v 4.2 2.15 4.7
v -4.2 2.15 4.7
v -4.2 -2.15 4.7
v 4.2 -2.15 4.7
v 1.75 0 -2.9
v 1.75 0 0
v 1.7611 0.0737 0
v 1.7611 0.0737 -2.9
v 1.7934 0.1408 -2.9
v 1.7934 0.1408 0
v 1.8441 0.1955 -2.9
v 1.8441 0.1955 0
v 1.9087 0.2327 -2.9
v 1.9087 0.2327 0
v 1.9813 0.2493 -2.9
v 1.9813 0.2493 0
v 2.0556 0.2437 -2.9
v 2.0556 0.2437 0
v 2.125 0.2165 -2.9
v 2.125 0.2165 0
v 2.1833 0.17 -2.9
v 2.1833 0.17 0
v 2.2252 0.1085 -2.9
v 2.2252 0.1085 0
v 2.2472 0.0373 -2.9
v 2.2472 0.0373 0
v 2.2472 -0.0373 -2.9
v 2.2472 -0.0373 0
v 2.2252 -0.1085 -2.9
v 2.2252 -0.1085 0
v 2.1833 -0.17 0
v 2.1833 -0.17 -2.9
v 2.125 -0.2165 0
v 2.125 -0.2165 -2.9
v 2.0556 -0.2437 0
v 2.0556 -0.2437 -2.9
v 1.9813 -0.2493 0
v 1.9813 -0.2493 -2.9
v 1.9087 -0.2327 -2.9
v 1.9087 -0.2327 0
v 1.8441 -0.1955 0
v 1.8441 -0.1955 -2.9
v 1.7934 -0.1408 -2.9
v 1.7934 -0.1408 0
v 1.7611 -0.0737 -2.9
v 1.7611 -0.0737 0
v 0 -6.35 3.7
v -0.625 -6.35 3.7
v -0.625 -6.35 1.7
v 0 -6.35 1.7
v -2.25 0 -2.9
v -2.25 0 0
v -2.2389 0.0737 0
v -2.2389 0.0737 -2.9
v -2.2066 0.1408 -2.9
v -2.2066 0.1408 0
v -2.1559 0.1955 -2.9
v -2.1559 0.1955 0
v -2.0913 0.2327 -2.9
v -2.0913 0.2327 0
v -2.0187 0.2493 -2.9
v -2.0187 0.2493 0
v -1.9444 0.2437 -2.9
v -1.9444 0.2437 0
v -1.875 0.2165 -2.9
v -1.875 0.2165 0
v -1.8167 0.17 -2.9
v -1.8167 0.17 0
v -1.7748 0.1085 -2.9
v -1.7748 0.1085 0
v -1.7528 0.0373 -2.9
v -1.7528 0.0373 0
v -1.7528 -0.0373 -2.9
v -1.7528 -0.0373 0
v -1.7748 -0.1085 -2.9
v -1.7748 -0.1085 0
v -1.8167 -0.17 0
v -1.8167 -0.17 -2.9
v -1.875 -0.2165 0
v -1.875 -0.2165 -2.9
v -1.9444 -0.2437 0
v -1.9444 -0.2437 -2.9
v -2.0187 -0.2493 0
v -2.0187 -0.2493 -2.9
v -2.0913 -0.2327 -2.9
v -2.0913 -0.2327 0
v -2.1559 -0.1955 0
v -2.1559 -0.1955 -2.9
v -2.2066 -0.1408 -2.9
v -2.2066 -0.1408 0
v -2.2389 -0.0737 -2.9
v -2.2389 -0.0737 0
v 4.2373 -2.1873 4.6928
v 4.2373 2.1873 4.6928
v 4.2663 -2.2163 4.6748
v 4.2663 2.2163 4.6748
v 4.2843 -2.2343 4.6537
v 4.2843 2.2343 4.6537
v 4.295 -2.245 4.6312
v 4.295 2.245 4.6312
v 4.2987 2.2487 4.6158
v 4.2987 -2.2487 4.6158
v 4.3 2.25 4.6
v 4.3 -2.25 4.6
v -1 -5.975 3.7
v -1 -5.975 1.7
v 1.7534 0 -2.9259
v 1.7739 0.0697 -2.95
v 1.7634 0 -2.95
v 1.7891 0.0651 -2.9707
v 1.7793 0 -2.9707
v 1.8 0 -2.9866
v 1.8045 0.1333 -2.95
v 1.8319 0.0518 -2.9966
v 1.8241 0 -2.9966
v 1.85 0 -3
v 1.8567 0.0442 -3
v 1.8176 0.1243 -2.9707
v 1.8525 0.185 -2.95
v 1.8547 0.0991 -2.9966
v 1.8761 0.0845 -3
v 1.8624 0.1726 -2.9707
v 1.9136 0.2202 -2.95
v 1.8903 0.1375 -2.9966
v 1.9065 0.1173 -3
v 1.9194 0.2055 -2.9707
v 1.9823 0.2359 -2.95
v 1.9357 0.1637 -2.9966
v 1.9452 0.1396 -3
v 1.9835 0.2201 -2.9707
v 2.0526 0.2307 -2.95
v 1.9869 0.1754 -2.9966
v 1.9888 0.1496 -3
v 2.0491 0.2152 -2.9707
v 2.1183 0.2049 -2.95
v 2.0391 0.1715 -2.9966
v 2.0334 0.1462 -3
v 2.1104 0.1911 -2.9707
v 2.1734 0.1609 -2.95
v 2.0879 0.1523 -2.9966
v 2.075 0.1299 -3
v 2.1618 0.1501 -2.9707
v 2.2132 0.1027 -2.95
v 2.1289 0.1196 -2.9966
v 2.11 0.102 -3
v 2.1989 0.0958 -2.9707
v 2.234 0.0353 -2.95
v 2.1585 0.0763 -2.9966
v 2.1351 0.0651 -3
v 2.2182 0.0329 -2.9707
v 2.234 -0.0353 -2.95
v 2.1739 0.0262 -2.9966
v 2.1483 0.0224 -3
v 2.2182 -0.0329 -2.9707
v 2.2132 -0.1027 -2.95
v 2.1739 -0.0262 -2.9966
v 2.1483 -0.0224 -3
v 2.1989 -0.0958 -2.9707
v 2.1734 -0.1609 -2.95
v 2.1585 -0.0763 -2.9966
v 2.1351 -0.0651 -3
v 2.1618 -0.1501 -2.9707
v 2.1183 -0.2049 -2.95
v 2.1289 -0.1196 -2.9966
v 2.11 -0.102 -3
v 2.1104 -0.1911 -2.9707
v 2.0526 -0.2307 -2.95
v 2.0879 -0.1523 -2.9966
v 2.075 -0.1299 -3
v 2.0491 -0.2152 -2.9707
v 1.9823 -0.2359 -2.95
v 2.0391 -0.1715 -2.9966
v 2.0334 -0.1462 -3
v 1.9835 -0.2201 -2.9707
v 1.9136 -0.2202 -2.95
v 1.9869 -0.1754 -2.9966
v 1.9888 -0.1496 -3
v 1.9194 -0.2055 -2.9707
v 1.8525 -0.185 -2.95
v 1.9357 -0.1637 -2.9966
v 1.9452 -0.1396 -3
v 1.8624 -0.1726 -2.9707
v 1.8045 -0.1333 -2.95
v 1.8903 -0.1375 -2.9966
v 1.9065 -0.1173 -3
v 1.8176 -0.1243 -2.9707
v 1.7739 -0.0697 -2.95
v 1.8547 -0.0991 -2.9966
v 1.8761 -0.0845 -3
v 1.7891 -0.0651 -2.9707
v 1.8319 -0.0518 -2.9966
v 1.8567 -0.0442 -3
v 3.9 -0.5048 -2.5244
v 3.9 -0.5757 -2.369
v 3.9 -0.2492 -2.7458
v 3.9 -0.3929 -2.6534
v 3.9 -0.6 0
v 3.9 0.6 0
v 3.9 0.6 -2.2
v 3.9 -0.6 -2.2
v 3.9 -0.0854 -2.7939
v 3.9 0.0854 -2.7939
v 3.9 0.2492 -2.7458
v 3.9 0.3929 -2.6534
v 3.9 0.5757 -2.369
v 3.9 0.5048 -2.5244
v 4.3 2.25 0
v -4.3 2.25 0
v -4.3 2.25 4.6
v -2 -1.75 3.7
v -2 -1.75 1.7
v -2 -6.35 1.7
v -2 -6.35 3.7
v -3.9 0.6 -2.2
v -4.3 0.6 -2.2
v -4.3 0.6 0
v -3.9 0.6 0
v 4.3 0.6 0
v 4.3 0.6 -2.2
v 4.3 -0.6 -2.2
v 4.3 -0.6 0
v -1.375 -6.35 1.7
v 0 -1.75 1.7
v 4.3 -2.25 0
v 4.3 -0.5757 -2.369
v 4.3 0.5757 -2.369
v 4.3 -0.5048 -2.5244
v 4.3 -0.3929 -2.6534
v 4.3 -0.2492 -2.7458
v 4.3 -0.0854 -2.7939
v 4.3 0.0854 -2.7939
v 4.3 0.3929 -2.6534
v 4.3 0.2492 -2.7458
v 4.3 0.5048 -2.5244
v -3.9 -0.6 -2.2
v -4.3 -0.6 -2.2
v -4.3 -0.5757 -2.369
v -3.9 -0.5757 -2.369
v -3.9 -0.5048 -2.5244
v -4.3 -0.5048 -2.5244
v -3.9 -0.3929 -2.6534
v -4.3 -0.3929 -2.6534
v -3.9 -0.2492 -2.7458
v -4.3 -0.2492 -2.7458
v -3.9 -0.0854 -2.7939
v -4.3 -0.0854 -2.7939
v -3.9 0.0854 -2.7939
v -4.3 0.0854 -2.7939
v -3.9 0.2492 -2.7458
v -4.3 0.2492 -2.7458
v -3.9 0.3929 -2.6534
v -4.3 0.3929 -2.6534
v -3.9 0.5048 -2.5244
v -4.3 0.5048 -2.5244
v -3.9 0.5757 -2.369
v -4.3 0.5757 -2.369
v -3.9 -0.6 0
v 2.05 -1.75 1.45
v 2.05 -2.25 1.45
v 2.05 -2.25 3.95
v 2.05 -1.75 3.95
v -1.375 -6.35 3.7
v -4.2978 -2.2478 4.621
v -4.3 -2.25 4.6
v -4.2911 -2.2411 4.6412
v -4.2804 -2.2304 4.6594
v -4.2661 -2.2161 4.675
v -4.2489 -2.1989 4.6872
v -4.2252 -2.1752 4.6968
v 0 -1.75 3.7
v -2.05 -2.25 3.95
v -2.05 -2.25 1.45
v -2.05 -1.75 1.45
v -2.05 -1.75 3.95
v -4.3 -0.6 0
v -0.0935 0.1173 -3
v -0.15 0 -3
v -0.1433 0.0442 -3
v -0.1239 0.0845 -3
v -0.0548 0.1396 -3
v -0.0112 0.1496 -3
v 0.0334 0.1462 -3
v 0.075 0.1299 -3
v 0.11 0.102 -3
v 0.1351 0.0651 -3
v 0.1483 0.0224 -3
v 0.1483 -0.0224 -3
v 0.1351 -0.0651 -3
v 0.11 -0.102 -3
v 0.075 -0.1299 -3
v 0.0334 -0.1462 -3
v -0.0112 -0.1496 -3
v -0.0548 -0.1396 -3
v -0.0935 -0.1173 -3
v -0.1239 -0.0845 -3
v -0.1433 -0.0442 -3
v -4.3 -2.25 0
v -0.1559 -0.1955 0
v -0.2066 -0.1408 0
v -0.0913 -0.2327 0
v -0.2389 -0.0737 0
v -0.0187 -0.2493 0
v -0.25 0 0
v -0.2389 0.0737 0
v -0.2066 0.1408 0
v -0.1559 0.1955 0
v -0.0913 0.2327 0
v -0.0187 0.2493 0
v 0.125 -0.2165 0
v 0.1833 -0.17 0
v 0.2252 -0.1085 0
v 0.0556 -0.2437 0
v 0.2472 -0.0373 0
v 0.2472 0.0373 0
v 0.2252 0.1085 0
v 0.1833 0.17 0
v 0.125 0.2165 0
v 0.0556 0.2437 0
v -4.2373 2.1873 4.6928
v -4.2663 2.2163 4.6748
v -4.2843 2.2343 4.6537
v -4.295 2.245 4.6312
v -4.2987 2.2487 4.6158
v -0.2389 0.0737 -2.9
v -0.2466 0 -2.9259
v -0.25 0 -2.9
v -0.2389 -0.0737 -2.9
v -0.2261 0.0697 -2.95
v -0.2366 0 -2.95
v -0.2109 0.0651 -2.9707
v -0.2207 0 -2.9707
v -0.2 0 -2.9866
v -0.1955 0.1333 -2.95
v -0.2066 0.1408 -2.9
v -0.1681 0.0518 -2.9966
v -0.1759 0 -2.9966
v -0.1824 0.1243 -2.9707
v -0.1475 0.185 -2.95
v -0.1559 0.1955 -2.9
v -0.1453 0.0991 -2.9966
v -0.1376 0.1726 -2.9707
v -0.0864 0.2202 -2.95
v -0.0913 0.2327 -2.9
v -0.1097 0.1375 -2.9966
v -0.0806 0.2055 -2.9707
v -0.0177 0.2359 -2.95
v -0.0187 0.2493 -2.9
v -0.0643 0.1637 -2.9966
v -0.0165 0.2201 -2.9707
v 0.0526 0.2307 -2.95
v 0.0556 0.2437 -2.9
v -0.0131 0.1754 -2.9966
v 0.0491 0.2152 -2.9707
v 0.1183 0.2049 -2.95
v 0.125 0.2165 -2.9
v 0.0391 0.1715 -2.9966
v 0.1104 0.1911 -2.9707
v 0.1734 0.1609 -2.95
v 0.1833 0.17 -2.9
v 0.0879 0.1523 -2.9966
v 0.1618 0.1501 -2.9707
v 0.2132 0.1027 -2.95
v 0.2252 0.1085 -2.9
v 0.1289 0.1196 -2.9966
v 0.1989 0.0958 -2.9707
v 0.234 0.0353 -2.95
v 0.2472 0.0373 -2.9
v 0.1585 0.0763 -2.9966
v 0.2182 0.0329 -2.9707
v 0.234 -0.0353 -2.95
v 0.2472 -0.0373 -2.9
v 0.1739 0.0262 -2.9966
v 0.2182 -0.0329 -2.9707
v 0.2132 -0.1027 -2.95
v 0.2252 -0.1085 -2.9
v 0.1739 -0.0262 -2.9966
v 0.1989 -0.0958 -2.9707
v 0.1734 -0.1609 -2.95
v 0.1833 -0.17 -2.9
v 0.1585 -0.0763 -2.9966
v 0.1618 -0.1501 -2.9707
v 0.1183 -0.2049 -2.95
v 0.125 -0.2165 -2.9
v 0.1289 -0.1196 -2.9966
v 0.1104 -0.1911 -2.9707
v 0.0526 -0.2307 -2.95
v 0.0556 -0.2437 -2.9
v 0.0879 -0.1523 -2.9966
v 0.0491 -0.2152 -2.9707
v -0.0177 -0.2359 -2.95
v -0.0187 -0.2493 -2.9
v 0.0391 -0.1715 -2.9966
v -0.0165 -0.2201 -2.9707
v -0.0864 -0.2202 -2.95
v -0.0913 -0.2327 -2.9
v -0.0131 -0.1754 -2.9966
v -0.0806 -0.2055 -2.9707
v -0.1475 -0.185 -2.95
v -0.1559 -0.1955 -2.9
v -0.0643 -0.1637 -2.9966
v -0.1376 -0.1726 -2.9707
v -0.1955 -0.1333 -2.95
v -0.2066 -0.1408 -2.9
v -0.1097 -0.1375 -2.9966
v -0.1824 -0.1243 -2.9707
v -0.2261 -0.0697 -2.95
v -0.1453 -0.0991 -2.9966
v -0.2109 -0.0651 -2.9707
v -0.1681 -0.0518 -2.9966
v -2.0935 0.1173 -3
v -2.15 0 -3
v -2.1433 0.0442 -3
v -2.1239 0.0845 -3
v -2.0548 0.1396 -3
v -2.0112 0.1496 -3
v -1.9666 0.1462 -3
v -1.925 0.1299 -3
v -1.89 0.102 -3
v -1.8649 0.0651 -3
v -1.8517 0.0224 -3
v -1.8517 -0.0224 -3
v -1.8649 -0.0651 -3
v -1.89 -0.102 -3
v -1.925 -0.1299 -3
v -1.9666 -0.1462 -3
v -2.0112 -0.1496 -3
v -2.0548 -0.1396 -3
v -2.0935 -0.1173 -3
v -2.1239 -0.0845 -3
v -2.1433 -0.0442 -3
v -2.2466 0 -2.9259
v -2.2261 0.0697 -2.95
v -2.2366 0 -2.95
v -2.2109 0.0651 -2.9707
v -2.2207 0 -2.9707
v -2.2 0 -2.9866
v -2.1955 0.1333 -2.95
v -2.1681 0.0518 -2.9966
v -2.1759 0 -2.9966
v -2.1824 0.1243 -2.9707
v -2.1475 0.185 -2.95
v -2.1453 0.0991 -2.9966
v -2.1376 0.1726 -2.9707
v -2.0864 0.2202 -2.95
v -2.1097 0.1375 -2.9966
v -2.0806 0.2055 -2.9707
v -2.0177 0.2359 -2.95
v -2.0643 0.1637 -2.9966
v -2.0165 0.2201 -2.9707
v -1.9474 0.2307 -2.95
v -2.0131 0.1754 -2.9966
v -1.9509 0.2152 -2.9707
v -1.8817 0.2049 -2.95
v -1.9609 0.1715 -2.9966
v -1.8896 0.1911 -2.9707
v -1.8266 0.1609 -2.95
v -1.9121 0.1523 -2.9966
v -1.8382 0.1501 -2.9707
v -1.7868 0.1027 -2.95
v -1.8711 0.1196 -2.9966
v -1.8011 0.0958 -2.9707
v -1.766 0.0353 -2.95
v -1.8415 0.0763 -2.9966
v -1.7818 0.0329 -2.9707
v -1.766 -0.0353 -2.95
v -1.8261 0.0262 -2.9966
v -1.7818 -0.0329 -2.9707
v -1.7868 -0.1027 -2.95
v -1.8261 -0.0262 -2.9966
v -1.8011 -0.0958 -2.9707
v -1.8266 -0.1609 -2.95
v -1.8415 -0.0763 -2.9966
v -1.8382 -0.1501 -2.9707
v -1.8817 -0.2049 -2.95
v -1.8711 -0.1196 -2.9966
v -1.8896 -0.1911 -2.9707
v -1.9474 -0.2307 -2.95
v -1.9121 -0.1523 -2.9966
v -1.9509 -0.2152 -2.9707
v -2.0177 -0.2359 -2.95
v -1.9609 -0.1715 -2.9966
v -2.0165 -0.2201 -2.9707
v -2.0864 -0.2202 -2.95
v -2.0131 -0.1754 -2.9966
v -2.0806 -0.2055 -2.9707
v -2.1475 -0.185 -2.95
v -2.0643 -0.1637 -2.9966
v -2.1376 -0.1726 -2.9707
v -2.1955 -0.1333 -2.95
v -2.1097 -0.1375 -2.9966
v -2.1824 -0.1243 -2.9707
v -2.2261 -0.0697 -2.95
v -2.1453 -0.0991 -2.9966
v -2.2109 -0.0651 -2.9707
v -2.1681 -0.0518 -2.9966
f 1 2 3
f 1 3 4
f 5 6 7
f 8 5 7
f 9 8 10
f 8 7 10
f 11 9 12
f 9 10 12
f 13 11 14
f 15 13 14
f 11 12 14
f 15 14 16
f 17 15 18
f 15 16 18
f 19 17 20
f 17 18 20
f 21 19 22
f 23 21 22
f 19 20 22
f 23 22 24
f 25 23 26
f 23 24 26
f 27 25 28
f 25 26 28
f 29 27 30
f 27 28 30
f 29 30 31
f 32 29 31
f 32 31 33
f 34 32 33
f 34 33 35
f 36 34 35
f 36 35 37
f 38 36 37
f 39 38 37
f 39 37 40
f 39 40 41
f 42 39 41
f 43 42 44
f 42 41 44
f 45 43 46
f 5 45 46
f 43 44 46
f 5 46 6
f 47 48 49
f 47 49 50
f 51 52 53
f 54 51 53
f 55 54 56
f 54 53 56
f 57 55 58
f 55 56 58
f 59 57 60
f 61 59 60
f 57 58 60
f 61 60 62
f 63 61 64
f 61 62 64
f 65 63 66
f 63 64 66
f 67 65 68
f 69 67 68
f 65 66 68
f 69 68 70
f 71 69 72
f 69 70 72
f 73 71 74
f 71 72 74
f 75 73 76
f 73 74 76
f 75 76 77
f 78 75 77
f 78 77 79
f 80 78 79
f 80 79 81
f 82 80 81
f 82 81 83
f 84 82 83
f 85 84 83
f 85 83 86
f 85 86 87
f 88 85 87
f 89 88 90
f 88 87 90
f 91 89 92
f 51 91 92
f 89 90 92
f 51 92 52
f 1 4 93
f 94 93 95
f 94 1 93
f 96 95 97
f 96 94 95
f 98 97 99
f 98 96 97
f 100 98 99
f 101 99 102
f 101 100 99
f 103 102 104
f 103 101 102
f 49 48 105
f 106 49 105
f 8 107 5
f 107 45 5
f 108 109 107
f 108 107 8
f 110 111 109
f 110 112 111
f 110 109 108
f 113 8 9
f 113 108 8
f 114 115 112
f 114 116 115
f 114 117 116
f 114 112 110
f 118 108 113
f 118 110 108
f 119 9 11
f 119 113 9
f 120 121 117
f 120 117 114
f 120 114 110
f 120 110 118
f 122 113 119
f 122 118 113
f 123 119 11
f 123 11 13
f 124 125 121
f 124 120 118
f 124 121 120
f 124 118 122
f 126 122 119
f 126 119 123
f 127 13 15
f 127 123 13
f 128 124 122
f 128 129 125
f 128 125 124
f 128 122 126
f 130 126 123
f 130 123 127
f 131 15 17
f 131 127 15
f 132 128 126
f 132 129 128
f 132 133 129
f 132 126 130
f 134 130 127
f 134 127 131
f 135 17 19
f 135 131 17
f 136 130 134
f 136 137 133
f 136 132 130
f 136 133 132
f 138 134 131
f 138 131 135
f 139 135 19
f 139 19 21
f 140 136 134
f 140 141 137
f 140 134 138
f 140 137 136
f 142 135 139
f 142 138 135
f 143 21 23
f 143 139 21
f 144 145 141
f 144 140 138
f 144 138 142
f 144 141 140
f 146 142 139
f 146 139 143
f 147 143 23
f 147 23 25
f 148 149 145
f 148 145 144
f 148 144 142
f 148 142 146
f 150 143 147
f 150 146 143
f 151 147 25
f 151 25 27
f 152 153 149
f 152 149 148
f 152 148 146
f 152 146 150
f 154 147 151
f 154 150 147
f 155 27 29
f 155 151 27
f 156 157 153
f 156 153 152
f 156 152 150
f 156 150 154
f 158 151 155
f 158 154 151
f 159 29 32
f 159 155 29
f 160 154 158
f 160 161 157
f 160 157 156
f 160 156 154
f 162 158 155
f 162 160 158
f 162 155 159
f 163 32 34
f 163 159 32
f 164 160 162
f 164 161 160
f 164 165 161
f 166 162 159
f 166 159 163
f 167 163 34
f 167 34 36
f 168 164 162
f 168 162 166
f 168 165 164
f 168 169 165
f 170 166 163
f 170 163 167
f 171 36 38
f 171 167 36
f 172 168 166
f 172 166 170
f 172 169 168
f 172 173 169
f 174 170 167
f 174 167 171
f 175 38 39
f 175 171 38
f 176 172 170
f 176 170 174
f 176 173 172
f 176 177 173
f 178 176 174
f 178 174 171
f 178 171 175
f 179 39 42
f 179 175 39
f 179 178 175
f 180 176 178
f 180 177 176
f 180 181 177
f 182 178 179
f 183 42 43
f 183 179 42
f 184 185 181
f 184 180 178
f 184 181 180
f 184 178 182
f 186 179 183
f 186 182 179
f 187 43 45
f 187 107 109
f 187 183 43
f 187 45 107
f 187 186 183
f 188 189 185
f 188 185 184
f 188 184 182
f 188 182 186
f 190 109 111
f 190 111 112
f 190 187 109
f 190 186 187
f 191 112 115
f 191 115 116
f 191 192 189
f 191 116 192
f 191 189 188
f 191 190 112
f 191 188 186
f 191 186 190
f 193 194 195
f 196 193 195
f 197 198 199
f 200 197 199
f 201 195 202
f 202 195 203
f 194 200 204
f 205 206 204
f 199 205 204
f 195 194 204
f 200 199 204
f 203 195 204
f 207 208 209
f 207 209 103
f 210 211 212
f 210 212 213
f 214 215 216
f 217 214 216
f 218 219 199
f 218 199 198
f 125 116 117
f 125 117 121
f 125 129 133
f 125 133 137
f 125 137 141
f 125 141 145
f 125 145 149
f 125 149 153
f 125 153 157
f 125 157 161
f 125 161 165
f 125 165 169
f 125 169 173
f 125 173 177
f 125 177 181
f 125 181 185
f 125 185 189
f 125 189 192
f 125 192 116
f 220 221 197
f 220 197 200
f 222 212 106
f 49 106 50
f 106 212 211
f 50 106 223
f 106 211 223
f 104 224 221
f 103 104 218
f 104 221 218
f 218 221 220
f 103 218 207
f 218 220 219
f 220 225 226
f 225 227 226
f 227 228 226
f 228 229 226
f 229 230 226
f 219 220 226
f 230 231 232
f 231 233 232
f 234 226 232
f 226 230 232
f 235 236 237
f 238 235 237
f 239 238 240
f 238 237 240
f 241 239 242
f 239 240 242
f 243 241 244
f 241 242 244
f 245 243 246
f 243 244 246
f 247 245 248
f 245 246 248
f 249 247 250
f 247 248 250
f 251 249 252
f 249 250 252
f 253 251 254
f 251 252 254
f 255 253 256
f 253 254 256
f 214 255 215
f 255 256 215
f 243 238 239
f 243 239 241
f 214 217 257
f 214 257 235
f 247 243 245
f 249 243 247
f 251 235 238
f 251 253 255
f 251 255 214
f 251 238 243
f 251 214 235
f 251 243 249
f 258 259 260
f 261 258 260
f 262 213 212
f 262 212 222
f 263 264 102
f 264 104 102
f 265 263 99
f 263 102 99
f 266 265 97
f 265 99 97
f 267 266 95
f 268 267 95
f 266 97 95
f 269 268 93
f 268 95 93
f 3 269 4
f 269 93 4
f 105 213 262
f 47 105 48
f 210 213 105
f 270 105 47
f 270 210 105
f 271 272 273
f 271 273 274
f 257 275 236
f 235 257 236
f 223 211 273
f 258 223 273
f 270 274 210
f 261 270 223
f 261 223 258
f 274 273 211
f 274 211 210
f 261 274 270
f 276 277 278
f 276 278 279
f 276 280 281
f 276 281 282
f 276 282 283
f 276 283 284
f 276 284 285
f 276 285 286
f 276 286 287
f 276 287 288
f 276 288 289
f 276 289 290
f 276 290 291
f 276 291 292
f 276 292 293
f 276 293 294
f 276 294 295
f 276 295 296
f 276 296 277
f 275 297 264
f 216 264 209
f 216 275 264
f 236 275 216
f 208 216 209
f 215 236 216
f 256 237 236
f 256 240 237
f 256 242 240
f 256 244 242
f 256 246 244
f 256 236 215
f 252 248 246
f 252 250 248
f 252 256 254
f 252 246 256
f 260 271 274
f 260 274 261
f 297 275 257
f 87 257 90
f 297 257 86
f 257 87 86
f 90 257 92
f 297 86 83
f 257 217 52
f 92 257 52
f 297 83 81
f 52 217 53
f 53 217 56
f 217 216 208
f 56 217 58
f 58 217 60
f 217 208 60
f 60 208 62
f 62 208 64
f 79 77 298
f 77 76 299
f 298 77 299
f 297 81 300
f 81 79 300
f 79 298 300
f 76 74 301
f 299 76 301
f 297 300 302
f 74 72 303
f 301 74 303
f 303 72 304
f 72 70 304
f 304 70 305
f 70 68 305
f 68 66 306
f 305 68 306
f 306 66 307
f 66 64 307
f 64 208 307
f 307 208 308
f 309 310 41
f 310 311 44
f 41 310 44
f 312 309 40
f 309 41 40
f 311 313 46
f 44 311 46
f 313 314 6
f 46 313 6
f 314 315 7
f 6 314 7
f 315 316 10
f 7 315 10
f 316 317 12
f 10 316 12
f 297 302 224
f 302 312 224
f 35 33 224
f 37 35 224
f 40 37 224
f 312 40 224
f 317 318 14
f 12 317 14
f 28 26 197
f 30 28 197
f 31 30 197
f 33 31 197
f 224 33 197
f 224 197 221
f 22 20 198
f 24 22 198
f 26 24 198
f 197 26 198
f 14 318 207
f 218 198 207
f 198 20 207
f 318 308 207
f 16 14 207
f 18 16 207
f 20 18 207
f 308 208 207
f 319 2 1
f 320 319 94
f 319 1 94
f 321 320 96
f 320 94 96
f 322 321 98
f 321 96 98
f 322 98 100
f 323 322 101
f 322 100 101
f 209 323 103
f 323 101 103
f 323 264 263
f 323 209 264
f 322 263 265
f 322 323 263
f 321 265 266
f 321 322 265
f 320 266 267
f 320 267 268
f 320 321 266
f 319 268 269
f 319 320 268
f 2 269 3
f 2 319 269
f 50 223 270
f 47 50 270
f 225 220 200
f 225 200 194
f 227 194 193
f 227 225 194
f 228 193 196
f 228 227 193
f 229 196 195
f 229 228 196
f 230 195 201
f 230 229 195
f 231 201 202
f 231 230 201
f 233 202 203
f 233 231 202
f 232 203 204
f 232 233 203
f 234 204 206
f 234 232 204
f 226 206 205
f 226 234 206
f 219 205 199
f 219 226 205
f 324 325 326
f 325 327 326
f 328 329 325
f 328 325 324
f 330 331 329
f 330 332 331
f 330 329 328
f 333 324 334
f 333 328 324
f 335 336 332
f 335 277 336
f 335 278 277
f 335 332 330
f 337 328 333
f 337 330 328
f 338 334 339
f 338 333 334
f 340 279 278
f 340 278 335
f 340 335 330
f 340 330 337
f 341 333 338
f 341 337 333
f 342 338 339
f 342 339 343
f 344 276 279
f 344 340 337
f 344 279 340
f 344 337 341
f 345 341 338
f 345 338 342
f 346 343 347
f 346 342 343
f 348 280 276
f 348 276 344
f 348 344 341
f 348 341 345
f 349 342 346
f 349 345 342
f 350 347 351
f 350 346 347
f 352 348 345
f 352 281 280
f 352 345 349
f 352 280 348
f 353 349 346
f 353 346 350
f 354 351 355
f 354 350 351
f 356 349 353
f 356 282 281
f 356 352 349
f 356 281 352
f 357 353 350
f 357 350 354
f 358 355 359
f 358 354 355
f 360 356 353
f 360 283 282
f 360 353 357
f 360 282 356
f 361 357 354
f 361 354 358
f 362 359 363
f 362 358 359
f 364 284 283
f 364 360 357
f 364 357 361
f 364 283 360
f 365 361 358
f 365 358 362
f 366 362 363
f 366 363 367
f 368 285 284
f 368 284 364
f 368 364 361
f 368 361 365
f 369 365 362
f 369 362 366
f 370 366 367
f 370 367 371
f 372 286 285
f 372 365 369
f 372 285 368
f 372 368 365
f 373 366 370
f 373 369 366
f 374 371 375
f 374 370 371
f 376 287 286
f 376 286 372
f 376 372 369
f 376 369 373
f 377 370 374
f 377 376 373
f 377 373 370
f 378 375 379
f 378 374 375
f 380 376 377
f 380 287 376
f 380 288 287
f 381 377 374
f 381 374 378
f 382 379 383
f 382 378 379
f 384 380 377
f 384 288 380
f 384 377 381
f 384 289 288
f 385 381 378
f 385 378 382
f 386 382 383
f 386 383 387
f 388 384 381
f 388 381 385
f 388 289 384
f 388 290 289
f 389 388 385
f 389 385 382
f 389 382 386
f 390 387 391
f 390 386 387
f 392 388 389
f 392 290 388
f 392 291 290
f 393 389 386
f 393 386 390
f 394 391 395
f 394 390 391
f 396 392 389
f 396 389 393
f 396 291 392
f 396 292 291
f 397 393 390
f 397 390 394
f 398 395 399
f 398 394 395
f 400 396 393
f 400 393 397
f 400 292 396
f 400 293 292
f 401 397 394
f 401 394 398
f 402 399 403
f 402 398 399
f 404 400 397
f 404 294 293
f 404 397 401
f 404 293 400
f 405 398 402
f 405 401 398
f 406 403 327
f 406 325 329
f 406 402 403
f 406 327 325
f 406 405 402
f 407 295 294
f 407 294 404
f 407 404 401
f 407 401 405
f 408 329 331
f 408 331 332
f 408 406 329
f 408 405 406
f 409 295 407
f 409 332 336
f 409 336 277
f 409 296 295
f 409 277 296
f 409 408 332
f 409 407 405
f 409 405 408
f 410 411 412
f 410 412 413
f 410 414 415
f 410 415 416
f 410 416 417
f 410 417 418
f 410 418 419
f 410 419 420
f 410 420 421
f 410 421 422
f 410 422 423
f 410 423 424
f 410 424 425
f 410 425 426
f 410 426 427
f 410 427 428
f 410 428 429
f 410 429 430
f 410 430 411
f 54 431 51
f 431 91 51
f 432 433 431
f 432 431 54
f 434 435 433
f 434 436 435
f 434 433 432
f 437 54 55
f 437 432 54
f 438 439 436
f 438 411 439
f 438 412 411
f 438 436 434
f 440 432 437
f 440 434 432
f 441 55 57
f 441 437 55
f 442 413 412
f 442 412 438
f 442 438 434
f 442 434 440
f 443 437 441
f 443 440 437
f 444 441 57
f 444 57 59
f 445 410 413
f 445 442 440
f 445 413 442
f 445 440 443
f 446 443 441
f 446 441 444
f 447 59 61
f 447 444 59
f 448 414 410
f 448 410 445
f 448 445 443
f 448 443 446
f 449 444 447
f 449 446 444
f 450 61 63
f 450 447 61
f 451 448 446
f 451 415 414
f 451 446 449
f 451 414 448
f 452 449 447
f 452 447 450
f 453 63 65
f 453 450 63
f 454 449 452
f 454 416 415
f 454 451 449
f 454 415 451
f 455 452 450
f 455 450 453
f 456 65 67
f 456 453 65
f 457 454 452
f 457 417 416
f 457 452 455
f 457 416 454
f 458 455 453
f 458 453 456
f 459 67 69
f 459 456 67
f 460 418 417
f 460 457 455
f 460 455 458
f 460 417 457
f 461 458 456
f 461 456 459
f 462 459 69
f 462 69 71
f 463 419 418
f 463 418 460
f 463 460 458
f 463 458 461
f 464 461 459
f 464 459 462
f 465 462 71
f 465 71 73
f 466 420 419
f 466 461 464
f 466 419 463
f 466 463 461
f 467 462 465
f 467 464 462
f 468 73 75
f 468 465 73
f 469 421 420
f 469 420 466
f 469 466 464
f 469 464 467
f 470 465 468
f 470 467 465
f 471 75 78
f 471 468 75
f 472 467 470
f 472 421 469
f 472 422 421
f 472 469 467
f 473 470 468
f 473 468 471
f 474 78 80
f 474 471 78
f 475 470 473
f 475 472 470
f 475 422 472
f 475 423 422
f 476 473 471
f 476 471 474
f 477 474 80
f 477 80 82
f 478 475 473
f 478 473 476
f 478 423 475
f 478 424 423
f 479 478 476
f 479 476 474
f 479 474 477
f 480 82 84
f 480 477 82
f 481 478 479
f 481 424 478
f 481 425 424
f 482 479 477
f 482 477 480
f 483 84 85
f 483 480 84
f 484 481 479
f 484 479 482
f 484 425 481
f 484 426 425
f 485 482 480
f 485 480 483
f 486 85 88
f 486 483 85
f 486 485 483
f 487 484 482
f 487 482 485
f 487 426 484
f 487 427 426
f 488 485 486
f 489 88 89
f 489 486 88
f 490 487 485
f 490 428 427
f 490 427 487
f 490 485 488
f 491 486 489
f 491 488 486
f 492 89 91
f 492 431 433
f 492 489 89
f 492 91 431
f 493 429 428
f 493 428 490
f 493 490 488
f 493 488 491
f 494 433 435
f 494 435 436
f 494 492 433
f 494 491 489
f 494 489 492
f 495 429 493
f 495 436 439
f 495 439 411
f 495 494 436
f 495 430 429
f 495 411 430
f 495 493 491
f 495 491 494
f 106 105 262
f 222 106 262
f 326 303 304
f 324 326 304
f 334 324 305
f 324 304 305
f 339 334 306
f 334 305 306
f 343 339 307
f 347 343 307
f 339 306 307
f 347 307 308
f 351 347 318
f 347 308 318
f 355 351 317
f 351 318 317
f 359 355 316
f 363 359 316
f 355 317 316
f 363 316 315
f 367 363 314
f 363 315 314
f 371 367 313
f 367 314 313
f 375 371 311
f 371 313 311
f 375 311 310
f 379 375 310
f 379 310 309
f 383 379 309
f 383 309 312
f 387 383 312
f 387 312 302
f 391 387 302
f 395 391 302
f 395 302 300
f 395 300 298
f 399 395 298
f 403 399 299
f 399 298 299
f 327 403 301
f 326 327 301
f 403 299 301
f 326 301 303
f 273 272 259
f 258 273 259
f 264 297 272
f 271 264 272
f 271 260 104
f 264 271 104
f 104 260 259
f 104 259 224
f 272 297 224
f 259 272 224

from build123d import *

# Parameters (mm, degrees)
SKETCH1_W           = 8.6
SKETCH1_H           = 4.5
BOSS_EXTRUDE1_DEPTH = 4.7
SKETCH2_W           = 4.1
SKETCH2_H           = 2.5
CUT_EXTRUDE1_DEPTH  = 0.5
BOSS_EXTRUDE2_DEPTH = 0.4
SKETCH4_R           = 0.25
BOSS_EXTRUDE3_DEPTH = 3
SKETCH5_W           = 2
SKETCH5_H           = 2
BOSS_EXTRUDE4_DEPTH = 4.6
CUT_EXTRUDE2_REACH  = 8.7
FILLET2_R           = 0.1


with BuildPart() as part:
    # Sketch1 → Boss-Extrude1 (new body)
    with BuildSketch(Plane.XY):
        Rectangle(SKETCH1_W, SKETCH1_H)
    extrude(amount=BOSS_EXTRUDE1_DEPTH)

    # Sketch2 → Cut-Extrude1 (cut)
    with BuildSketch(Plane.XZ.offset(2.25)):
        with Locations((0, 2.7)):
            Rectangle(SKETCH2_W, SKETCH2_H)
    extrude(amount=-CUT_EXTRUDE1_DEPTH, mode=Mode.SUBTRACT)

    # Sketch3 → Boss-Extrude2 (add)
    with BuildSketch(Plane(origin=(4.3, 0, 0), x_dir=(0, 0, -1), z_dir=(1, 0, 0))):
        with BuildLine():
            Line((0, 0.6), (0, -0.6))
            Line((0, -0.6), (2.2, -0.6))
            ThreePointArc((2.2, -0.6), (2.8, 0), (2.2, 0.6))
            Line((2.2, 0.6), (0, 0.6))
        make_face()
    boss_extrude2 = extrude(amount=-BOSS_EXTRUDE2_DEPTH)

    # Mirror1: Boss-Extrude2 across plane
    add(boss_extrude2.mirror(Plane(origin=(0, 0, 0), x_dir=(0, 0, 1), z_dir=(1, 0, 0))))

    # Sketch4 → Boss-Extrude3 (add)
    with BuildSketch(Plane(origin=(0, 0, 0), x_dir=(-1, 0, 0), z_dir=(0, 0, -1))):
        with Locations((2, 0)):
            Circle(SKETCH4_R)
        Circle(SKETCH4_R)
        with Locations((-2, 0)):
            Circle(SKETCH4_R)
    extrude(amount=BOSS_EXTRUDE3_DEPTH)

    # Sketch5 → Boss-Extrude4 (add)
    with BuildSketch(Plane.XZ.offset(1.75)):
        with Locations((-1, 2.7)):
            Rectangle(SKETCH5_W, SKETCH5_H)
    extrude(amount=BOSS_EXTRUDE4_DEPTH)

    # Sketch6 → Cut-Extrude2 (cut, up to next)
    with BuildSketch(Plane.XY.offset(3.7), mode=Mode.PRIVATE) as cut_extrude2_sk1:
        Polygon((-1, -5.975), (-1.375, -6.35), (-0.625, -6.35), align=None)
    cut_extrude2_tool1 = extrude(cut_extrude2_sk1.sketch, amount=-CUT_EXTRUDE2_REACH, mode=Mode.PRIVATE) & part.part
    add(cut_extrude2_tool1.solids().sort_by_distance((-1, -6.225, 3.7))[0], mode=Mode.SUBTRACT)

    # Fillet2
    fillet2_edges = [part.edges().sort_by_distance(p)[0] for p in [
        (4.3, 0, 4.7),
        (0, 2.25, 4.7),
        (-4.3, 0, 4.7),
        (-1.75, 0, -3),
        (0.25, 0, -3),
        (2.25, 0, -3),
        (0, -2.25, 4.7),
    ]]
    fillet(fillet2_edges, radius=FILLET2_R)


solid = part.part
